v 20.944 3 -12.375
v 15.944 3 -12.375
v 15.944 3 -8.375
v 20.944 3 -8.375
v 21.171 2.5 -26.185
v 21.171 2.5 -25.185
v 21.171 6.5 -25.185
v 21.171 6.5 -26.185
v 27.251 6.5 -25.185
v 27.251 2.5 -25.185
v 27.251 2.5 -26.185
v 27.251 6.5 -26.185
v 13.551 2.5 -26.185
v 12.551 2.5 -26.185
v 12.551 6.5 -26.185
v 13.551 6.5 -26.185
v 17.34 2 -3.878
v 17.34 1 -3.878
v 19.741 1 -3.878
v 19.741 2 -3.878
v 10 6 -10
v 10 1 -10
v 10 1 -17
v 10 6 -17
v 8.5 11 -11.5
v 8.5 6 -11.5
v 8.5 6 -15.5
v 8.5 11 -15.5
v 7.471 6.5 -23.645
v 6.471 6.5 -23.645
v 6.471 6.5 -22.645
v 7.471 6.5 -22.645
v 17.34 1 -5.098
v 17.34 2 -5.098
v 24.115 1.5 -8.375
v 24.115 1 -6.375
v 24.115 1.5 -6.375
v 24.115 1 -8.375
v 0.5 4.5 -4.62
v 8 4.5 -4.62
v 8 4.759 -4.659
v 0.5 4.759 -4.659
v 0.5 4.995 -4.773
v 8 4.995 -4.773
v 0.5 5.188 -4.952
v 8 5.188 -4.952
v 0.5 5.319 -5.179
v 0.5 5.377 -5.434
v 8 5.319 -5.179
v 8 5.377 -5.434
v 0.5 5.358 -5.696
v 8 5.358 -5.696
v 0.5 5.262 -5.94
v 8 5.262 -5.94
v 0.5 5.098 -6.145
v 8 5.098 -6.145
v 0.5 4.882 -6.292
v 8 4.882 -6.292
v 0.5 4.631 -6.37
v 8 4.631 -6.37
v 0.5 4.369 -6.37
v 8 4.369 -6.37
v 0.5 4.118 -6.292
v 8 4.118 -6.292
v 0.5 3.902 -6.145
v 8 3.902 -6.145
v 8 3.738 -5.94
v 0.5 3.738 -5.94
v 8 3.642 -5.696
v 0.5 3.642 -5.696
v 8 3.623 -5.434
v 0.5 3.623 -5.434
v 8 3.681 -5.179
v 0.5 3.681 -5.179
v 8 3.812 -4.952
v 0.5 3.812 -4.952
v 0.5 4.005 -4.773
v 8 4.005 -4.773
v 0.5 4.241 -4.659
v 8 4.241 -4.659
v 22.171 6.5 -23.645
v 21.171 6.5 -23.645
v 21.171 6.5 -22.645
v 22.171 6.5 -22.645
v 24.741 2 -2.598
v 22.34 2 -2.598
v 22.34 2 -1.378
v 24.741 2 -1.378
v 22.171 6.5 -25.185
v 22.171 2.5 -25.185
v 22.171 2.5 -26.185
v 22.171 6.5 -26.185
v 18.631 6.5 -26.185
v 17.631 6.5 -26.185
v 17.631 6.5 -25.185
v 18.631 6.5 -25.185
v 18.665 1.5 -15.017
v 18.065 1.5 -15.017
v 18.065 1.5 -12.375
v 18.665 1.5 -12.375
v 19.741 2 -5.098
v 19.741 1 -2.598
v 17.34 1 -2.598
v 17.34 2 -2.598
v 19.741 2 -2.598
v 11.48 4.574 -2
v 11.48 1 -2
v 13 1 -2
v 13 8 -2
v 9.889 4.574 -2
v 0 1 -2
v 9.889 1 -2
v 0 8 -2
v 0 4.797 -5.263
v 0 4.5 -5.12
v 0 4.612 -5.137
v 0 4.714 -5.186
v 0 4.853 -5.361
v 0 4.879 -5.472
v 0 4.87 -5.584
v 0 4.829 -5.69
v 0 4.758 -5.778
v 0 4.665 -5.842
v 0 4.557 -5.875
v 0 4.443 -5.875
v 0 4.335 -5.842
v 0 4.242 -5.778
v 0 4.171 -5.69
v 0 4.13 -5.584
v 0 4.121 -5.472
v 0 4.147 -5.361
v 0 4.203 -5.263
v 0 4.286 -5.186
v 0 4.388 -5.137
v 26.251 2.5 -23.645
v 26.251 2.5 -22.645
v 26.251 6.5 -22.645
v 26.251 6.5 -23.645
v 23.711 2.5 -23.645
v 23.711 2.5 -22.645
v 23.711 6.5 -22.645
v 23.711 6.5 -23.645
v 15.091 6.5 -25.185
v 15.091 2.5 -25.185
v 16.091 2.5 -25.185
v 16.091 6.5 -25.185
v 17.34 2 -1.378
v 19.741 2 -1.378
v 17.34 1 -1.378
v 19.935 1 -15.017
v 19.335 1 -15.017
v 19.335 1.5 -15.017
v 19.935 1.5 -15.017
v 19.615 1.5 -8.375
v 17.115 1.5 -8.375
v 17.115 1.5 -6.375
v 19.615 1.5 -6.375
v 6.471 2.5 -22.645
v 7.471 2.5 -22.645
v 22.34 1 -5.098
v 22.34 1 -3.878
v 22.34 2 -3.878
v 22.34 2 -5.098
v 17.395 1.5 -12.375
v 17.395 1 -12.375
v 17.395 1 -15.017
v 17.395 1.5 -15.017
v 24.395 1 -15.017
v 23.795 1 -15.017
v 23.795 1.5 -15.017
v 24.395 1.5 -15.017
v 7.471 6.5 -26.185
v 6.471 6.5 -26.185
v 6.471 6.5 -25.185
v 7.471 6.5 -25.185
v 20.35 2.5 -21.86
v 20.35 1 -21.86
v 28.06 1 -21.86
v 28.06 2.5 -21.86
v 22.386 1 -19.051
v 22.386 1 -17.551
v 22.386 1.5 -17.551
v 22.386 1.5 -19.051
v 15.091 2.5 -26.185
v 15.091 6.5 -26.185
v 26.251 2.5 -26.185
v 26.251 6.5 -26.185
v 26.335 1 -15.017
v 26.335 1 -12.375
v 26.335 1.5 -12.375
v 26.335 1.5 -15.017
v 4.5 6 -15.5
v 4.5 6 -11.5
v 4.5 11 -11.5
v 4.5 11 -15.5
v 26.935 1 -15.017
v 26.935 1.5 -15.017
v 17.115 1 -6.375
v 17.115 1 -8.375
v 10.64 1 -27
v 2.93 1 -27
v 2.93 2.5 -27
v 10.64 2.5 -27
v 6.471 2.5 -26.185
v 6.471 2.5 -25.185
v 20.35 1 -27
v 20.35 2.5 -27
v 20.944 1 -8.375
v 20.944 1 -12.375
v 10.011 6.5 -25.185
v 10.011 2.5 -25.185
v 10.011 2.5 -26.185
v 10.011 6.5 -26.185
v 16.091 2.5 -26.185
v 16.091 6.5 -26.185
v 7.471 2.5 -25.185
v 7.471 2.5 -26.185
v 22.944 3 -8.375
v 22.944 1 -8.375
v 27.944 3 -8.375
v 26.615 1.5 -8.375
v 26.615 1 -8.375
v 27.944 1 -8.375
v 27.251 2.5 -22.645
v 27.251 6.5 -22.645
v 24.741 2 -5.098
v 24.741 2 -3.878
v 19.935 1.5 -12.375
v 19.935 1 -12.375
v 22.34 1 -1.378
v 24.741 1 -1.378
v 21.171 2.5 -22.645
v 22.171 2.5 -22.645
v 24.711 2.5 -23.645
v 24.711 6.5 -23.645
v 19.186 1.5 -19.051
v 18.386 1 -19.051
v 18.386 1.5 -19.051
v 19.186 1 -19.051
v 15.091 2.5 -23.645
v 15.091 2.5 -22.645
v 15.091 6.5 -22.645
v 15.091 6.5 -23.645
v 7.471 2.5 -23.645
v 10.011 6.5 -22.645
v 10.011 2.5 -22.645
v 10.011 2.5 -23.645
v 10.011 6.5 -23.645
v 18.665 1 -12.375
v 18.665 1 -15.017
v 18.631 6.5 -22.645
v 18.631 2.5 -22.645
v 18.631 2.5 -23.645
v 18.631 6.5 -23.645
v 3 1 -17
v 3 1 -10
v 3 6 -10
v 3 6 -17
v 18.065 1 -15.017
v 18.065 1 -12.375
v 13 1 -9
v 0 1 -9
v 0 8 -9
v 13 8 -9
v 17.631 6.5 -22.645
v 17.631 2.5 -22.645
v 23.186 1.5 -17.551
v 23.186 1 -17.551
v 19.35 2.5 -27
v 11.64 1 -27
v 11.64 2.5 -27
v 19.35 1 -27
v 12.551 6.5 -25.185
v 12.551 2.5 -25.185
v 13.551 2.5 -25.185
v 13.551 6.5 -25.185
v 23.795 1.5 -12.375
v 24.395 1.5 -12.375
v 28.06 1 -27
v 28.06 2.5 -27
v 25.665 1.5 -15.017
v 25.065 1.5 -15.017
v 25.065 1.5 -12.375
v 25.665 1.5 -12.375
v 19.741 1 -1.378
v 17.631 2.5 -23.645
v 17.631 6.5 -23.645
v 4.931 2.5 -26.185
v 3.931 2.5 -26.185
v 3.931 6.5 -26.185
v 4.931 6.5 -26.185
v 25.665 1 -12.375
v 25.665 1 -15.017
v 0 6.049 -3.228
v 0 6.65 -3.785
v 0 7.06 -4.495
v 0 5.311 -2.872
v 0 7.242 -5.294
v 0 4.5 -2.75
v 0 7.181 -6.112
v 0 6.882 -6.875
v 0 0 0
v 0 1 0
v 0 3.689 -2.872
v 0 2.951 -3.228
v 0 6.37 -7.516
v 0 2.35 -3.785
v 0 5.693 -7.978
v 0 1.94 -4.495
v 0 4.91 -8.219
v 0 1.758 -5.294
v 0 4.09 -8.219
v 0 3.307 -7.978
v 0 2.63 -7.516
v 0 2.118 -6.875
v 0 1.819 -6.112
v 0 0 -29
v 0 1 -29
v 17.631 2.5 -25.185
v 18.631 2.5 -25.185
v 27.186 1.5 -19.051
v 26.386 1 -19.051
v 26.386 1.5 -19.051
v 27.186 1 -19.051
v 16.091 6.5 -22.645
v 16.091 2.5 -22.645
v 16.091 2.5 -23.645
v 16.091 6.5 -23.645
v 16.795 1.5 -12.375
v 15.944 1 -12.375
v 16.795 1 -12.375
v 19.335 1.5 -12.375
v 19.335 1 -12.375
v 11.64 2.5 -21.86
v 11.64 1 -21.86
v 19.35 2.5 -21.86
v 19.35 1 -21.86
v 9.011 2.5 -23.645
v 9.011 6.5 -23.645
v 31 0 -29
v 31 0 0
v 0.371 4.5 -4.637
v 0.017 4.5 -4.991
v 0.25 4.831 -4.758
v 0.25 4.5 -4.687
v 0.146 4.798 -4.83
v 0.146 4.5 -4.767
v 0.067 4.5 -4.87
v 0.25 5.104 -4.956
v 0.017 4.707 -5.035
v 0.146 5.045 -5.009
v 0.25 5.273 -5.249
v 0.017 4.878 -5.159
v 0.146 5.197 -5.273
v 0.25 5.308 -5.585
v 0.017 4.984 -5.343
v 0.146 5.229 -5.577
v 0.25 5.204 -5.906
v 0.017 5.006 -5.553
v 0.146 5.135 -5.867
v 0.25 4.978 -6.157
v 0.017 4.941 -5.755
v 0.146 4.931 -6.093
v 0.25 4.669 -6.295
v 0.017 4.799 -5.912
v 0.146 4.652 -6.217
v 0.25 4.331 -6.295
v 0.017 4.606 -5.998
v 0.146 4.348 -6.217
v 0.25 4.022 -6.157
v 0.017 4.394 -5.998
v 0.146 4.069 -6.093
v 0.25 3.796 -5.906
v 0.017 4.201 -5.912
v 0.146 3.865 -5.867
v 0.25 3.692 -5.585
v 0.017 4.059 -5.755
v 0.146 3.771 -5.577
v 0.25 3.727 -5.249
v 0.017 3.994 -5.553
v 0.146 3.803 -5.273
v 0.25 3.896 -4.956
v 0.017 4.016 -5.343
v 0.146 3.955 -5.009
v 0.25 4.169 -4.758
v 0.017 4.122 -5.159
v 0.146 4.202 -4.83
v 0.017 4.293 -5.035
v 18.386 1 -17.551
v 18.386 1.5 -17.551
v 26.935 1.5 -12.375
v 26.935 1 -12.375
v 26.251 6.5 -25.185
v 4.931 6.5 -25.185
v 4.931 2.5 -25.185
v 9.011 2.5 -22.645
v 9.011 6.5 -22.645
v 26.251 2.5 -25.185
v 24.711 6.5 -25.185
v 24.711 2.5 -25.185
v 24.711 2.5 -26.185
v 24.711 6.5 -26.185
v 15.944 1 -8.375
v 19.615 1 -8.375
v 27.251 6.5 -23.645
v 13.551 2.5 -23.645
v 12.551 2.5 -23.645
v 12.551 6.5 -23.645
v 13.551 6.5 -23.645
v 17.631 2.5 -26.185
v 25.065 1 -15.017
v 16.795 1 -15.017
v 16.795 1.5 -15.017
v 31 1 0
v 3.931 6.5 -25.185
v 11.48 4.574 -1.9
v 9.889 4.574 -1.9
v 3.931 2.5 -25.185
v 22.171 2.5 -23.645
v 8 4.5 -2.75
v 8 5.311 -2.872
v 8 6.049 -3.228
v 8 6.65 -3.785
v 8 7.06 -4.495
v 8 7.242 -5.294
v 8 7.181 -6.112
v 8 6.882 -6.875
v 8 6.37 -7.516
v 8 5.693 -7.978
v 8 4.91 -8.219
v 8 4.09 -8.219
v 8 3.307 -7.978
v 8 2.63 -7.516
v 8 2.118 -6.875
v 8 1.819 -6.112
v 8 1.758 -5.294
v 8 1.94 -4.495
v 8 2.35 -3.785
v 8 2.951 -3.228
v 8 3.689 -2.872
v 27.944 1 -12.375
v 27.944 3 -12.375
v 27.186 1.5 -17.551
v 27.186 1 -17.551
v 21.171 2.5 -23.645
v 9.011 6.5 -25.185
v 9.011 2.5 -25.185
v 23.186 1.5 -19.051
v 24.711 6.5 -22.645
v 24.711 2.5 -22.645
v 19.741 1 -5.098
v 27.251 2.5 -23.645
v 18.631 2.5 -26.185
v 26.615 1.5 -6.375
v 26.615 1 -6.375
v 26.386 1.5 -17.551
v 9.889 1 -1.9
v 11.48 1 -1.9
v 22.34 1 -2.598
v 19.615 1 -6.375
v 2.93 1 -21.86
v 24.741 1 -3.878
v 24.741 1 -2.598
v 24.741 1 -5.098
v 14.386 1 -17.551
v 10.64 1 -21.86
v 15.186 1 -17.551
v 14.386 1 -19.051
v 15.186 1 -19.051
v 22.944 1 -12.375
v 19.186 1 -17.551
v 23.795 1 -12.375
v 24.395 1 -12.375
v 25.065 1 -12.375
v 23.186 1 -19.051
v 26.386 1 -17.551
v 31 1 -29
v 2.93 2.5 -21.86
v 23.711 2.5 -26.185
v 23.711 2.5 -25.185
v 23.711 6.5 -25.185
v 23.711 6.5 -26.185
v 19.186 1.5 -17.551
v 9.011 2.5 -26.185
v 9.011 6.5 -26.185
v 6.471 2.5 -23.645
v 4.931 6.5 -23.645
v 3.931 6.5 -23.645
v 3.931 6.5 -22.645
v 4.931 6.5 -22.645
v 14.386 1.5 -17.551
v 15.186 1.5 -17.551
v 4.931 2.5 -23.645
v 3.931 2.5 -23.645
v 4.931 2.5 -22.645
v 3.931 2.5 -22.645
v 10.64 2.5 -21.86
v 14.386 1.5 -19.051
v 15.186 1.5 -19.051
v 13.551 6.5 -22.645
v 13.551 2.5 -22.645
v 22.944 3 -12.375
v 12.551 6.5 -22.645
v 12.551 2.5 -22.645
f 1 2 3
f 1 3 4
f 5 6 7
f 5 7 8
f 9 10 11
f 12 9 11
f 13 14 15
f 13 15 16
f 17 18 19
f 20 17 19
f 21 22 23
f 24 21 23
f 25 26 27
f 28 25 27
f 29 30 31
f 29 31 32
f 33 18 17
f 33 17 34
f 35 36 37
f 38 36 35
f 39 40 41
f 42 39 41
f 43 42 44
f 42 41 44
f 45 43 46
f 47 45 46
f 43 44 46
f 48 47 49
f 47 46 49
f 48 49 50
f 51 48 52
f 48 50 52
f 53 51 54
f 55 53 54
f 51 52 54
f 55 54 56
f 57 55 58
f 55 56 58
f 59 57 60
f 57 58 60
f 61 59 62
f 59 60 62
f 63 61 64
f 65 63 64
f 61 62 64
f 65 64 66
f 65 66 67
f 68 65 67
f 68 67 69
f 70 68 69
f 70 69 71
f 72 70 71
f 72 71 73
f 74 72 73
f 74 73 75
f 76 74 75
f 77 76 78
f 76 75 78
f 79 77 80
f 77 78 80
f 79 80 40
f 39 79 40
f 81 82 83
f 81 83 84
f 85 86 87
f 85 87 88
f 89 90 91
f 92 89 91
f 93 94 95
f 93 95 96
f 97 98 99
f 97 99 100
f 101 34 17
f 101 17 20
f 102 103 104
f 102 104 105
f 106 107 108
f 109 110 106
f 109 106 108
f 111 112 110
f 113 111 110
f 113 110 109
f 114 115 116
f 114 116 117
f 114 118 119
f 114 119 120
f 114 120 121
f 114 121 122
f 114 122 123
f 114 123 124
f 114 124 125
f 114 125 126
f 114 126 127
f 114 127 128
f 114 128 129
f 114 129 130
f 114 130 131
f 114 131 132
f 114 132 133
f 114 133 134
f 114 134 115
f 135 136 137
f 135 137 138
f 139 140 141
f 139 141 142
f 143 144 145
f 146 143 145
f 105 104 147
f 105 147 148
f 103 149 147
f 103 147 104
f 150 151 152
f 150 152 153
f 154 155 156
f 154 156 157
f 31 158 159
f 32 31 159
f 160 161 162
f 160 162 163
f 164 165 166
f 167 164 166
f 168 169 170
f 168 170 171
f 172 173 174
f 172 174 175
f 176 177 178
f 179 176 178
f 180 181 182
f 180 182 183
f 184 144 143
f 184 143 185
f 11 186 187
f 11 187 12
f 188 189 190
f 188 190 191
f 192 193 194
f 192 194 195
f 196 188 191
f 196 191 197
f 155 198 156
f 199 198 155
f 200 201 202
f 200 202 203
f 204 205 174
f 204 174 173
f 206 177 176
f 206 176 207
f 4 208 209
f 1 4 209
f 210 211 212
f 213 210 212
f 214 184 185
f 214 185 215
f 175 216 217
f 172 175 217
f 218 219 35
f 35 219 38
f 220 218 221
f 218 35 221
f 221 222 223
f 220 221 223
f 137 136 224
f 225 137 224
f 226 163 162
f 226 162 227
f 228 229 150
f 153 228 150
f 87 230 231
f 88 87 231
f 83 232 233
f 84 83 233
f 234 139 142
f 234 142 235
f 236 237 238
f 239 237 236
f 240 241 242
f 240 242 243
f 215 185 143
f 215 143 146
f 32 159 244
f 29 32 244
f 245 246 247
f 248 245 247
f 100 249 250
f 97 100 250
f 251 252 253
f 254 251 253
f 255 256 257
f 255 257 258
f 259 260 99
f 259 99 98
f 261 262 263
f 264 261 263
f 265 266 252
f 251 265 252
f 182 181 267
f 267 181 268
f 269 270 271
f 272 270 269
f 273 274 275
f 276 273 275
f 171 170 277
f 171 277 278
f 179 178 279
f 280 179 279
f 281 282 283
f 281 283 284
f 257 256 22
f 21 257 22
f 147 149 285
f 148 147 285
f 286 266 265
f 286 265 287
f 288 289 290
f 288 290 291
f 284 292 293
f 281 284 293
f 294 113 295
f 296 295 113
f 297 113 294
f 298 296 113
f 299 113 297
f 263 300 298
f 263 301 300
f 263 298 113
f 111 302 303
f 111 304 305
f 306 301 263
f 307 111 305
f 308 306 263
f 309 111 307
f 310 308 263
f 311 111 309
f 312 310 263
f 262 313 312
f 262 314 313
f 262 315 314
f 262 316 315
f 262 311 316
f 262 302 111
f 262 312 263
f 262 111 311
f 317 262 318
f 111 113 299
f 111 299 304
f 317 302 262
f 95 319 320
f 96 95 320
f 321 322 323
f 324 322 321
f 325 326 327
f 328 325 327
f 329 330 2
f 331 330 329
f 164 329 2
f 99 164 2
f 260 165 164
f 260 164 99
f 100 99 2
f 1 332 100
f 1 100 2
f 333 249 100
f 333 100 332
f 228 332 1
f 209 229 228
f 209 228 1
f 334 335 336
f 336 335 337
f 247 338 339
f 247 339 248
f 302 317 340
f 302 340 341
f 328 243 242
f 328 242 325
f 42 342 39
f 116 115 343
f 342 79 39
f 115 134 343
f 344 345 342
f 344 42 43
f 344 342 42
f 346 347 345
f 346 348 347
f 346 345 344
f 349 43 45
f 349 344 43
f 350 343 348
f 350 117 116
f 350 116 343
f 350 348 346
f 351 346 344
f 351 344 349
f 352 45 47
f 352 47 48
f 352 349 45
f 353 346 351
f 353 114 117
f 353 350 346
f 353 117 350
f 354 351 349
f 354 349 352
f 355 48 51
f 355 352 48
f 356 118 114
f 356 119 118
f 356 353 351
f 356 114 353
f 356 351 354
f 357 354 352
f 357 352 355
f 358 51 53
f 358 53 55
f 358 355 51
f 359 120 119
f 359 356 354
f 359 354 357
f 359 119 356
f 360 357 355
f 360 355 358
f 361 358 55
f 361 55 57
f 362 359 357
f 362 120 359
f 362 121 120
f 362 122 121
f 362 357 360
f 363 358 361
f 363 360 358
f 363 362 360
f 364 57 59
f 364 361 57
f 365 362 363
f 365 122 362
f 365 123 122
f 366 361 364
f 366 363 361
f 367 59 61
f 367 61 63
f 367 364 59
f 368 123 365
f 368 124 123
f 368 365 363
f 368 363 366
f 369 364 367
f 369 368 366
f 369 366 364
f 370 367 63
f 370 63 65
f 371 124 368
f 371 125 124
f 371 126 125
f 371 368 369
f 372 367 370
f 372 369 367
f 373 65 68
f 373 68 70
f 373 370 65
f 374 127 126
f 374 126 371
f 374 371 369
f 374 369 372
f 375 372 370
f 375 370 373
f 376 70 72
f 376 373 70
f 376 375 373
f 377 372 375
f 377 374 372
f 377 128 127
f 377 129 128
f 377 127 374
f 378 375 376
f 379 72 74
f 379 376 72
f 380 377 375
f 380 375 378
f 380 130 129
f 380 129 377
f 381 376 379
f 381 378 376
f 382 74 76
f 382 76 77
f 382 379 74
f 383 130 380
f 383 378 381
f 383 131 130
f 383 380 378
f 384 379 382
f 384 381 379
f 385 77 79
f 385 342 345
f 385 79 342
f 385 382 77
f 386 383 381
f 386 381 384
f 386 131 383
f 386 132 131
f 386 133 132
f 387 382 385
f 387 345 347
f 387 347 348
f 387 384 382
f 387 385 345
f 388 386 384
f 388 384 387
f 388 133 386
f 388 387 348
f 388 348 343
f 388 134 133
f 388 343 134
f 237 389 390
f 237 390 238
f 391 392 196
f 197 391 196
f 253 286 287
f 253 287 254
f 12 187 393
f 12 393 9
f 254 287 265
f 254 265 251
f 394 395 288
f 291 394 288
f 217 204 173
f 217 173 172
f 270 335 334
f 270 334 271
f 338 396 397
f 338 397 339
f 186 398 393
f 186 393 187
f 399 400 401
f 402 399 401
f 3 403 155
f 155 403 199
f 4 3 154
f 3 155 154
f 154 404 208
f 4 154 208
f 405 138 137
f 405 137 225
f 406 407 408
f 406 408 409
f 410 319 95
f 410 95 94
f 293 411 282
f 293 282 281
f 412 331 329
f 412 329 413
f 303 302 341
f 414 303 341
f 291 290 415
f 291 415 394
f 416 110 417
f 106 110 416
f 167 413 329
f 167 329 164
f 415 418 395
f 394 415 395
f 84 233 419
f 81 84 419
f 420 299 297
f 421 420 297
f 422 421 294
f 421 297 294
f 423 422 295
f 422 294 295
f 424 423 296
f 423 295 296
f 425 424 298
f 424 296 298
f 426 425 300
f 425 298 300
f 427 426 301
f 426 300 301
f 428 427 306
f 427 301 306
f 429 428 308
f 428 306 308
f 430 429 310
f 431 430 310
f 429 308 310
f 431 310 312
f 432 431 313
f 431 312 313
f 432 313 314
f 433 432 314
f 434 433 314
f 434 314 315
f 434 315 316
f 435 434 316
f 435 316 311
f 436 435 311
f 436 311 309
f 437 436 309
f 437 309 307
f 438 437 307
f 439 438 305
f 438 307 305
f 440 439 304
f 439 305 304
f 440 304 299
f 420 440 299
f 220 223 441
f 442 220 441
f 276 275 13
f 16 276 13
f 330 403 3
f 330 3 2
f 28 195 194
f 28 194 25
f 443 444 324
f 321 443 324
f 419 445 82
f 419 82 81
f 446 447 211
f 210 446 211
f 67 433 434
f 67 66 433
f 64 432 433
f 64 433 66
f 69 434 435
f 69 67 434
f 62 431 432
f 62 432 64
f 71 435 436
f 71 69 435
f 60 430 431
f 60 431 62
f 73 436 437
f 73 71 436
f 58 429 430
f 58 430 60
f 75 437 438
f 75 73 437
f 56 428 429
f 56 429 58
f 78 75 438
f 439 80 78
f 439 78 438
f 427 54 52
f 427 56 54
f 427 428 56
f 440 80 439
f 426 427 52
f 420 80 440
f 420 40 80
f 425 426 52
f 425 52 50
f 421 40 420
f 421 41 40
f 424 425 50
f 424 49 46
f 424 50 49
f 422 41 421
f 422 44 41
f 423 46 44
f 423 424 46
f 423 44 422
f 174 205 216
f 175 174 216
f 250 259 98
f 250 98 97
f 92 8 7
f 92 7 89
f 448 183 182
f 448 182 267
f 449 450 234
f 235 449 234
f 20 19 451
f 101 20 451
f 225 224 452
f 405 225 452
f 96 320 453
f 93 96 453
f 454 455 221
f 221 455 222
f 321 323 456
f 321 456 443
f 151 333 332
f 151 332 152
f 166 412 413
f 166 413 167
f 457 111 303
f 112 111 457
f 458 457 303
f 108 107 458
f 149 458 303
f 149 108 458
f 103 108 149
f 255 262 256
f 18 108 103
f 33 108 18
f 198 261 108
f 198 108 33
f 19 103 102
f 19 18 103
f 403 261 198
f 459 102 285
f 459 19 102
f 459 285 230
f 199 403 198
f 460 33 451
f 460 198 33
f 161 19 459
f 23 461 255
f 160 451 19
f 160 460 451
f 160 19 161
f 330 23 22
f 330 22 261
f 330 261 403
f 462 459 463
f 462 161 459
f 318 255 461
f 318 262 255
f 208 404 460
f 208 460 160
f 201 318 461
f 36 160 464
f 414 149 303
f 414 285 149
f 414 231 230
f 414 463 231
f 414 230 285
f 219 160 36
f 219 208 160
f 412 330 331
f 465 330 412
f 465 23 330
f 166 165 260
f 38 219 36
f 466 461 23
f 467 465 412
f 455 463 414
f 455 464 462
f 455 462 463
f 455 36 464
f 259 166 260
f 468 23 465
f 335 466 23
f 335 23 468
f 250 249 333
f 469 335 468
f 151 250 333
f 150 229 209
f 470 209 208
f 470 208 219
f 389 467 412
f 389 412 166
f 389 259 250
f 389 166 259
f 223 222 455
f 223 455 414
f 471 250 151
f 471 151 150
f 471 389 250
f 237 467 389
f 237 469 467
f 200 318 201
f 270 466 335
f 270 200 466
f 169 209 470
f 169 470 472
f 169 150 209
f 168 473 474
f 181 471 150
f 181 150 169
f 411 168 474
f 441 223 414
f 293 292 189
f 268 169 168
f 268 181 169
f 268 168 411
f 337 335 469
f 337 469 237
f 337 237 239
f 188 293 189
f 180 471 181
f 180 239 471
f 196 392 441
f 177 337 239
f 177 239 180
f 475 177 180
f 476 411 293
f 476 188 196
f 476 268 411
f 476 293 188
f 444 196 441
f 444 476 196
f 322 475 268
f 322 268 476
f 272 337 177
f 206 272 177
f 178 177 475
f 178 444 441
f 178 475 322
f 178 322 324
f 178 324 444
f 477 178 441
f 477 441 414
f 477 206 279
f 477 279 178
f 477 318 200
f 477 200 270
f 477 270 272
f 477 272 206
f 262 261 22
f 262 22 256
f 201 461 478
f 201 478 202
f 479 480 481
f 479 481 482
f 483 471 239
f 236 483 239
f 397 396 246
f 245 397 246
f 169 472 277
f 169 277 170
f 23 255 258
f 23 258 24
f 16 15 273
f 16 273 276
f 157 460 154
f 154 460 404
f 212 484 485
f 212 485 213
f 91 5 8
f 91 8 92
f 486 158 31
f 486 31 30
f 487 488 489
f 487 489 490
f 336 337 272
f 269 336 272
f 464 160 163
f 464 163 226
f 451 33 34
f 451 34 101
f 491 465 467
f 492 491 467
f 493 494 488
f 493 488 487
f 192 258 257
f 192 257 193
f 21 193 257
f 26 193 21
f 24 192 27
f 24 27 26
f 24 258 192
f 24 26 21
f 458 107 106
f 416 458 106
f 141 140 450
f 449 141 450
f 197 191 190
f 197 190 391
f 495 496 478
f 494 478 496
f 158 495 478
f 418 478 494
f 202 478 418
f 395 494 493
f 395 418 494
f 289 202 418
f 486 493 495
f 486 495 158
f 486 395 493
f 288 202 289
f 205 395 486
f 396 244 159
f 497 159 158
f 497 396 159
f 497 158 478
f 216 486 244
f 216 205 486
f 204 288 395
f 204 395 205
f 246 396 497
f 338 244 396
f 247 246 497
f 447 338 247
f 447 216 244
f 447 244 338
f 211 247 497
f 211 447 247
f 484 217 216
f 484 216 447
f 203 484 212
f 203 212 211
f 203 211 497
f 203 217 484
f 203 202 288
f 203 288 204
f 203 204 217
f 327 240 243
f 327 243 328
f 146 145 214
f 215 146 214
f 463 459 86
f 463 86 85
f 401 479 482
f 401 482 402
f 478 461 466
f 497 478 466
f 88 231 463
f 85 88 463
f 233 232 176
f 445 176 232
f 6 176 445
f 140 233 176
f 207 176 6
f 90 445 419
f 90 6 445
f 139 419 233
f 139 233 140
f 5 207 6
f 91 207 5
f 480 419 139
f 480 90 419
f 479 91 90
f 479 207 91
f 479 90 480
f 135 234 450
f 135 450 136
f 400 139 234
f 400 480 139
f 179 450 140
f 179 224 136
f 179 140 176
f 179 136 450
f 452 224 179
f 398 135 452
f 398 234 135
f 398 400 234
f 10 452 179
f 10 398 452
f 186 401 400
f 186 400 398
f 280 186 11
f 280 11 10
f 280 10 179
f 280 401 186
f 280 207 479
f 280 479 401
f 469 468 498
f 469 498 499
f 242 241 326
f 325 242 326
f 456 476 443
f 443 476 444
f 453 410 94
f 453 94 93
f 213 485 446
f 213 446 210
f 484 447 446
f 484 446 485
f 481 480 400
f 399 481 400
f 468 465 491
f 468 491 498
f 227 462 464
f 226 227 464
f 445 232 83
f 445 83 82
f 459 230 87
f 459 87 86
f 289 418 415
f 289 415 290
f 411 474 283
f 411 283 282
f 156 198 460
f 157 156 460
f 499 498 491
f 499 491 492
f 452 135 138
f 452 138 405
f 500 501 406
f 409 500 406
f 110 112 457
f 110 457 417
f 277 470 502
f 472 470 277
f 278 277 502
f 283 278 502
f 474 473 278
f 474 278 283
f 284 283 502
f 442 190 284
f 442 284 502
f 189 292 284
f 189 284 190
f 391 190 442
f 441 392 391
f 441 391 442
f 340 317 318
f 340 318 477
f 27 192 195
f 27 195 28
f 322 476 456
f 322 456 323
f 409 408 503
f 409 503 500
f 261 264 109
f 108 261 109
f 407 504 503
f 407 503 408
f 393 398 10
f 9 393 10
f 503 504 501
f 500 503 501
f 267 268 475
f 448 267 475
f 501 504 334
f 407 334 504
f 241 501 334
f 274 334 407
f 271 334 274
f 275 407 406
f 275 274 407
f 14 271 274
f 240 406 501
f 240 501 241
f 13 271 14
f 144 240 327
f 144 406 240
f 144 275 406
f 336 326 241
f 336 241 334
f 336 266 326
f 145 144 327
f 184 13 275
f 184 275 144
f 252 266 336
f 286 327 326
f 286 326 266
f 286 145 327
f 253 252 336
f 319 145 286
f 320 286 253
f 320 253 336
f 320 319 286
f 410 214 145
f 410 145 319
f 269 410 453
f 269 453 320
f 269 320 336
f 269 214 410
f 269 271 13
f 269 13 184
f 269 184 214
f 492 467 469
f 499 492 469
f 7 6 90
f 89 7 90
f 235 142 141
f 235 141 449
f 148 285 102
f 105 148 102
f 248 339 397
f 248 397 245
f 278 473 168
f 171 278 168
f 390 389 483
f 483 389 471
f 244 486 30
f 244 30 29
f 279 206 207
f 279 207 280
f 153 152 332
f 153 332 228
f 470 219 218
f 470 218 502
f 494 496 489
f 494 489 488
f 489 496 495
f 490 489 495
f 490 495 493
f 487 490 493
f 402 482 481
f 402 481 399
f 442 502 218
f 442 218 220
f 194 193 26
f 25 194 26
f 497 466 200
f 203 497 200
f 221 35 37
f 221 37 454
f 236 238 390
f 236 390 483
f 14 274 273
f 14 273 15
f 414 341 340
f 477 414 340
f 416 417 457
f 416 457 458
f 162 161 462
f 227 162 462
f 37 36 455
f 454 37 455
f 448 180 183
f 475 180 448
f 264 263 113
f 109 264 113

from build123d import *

# Parameters (mm, degrees)
SKETCH1_W            = 31
SKETCH1_H            = 29
BOSS_EXTRUDE1_DEPTH  = 1
SKETCH2_W            = 7
SKETCH2_H            = 8
BOSS_EXTRUDE2_DEPTH  = 13
SKETCH3_W            = 7
SKETCH3_H            = 7
BOSS_EXTRUDE3_DEPTH  = 5
SKETCH4_W            = 4
SKETCH4_H            = 4
BOSS_EXTRUDE4_DEPTH  = 5
SKETCH5_R            = 2.75
CUT_EXTRUDE1_DEPTH   = 8
SKETCH6_W            = 1.591238362
SKETCH6_H            = 3.57435367
BOSS_EXTRUDE5_DEPTH  = 0.1
SKETCH7_R            = 0.879599875
BOSS_EXTRUDE6_DEPTH  = 8
FILLET2_R            = 0.5
SKETCH8_W            = 7.71
SKETCH8_H            = 5.14
BOSS_EXTRUDE7_DEPTH  = 1.5
SKETCH9_W            = 1
SKETCH9_H            = 1
BOSS_EXTRUDE8_DEPTH  = 4
SKETCH10_W           = 0.8
SKETCH10_H           = 1.5
BOSS_EXTRUDE9_DEPTH  = 0.5
SKETCH11_W           = 5
SKETCH11_H           = 4
BOSS_EXTRUDE10_DEPTH = 2
SKETCH12_W           = 0.6
SKETCH12_H           = 2.642715267
BOSS_EXTRUDE11_DEPTH = 0.5
SKETCH13_W           = 2.5
SKETCH13_H           = 2
BOSS_EXTRUDE12_DEPTH = 0.5
SKETCH14_W           = 2.401106116
SKETCH14_H           = 1.2192983
BOSS_EXTRUDE13_DEPTH = 1


with BuildPart() as part:
    # Sketch1 → Boss-Extrude1 (new body)
    with BuildSketch(Plane(origin=(0, 0, 0), x_dir=(1, 0, 0), z_dir=(0, 1, 0))):
        with Locations((15.5, 14.5)):
            Rectangle(SKETCH1_W, SKETCH1_H)
    extrude(amount=BOSS_EXTRUDE1_DEPTH)

    # Sketch2 → Boss-Extrude2 (add)
    with BuildSketch(Plane.ZY):
        with Locations((-5.5, 4)):
            Rectangle(SKETCH2_W, SKETCH2_H)
    extrude(amount=-BOSS_EXTRUDE2_DEPTH)

    # Sketch3 → Boss-Extrude3 (add)
    with BuildSketch(Plane(origin=(0, 1, 0), x_dir=(1, 0, 0), z_dir=(0, 1, 0))):
        with Locations((6.5, 13.5)):
            Rectangle(SKETCH3_W, SKETCH3_H)
    extrude(amount=BOSS_EXTRUDE3_DEPTH)

    # Sketch4 → Boss-Extrude4 (add)
    with BuildSketch(Plane(origin=(0, 6, 0), x_dir=(1, 0, 0), z_dir=(0, 1, 0))):
        with Locations((6.5, 13.5)):
            Rectangle(SKETCH4_W, SKETCH4_H)
    extrude(amount=BOSS_EXTRUDE4_DEPTH)

    # Sketch5 → Cut-Extrude1 (cut)
    with BuildSketch(Plane.ZY):
        with Locations((-5.5, 4.5)):
            Circle(SKETCH5_R)
    extrude(amount=-CUT_EXTRUDE1_DEPTH, mode=Mode.SUBTRACT)

    # Sketch6 → Boss-Extrude5 (add)
    with BuildSketch(Plane.XY.offset(-2)):
        with Locations((10.684219388, 2.787176835)):
            Rectangle(SKETCH6_W, SKETCH6_H)
    extrude(amount=BOSS_EXTRUDE5_DEPTH)

    # Sketch7 → Boss-Extrude6 (add)
    with BuildSketch(Plane.ZY.offset(-8)):
        with Locations((-5.5, 4.5)):
            Circle(SKETCH7_R)
    extrude(amount=BOSS_EXTRUDE6_DEPTH)

    # Fillet2
    fillet2_edges = [part.edges().sort_by_distance(p)[0] for p in [
        (0, 4.5, -6.379599875),
    ]]
    fillet(fillet2_edges, radius=FILLET2_R)

    # Sketch8 → Boss-Extrude7 (add)
    with BuildSketch(Plane(origin=(0, 1, 0), x_dir=(1, 0, 0), z_dir=(0, 1, 0))):
        with Locations((15.495, 24.43)):
            Rectangle(SKETCH8_W, SKETCH8_H)
        with Locations((6.785, 24.43)):
            Rectangle(SKETCH8_W, SKETCH8_H)
        with Locations((24.205, 24.43)):
            Rectangle(SKETCH8_W, SKETCH8_H)
    extrude(amount=BOSS_EXTRUDE7_DEPTH)

    # Sketch9 → Boss-Extrude8 (add)
    with BuildSketch(Plane(origin=(0, 2.5, 0), x_dir=(1, 0, 0), z_dir=(0, 1, 0))):
        with Locations((6.971468334, 25.685)):
            Rectangle(SKETCH9_W, SKETCH9_H)
        with Locations((4.431468334, 25.685)):
            Rectangle(SKETCH9_W, SKETCH9_H)
        with Locations((9.511468334, 25.685)):
            Rectangle(SKETCH9_W, SKETCH9_H)
        with Locations((4.431468334, 23.145)):
            Rectangle(SKETCH9_W, SKETCH9_H)
        with Locations((13.051468334, 23.145)):
            Rectangle(SKETCH9_W, SKETCH9_H)
        with Locations((6.971468334, 23.145)):
            Rectangle(SKETCH9_W, SKETCH9_H)
        with Locations((9.511468334, 23.145)):
            Rectangle(SKETCH9_W, SKETCH9_H)
        with Locations((18.131468334, 25.685)):
            Rectangle(SKETCH9_W, SKETCH9_H)
        with Locations((18.131468334, 23.145)):
            Rectangle(SKETCH9_W, SKETCH9_H)
        with Locations((15.591468334, 23.145)):
            Rectangle(SKETCH9_W, SKETCH9_H)
        with Locations((15.591468334, 25.685)):
            Rectangle(SKETCH9_W, SKETCH9_H)
        with Locations((13.051468334, 25.685)):
            Rectangle(SKETCH9_W, SKETCH9_H)
        with Locations((21.671468334, 23.145)):
            Rectangle(SKETCH9_W, SKETCH9_H)
        with Locations((26.751468334, 25.685)):
            Rectangle(SKETCH9_W, SKETCH9_H)
        with Locations((26.751468334, 23.145)):
            Rectangle(SKETCH9_W, SKETCH9_H)
        with Locations((24.211468334, 23.145)):
            Rectangle(SKETCH9_W, SKETCH9_H)
        with Locations((24.211468334, 25.685)):
            Rectangle(SKETCH9_W, SKETCH9_H)
        with Locations((21.671468334, 25.685)):
            Rectangle(SKETCH9_W, SKETCH9_H)
    extrude(amount=BOSS_EXTRUDE8_DEPTH)

    # Sketch10 → Boss-Extrude9 (add)
    with BuildSketch(Plane(origin=(0, 1, 0), x_dir=(1, 0, 0), z_dir=(0, 1, 0))):
        with Locations((18.786083485, 18.300770285)):
            Rectangle(SKETCH10_W, SKETCH10_H)
        with Locations((14.786083485, 18.300770285)):
            Rectangle(SKETCH10_W, SKETCH10_H)
        with Locations((22.786083485, 18.300770285)):
            Rectangle(SKETCH10_W, SKETCH10_H)
        with Locations((26.786083485, 18.300770285)):
            Rectangle(SKETCH10_W, SKETCH10_H)
    extrude(amount=BOSS_EXTRUDE9_DEPTH)

    # Sketch11 → Boss-Extrude10 (add)
    with BuildSketch(Plane(origin=(0, 1, 0), x_dir=(1, 0, 0), z_dir=(0, 1, 0))):
        with Locations((25.443805994, 10.374755585)):
            Rectangle(SKETCH11_W, SKETCH11_H)
        with Locations((18.443805994, 10.374755585)):
            Rectangle(SKETCH11_W, SKETCH11_H)
    extrude(amount=BOSS_EXTRUDE10_DEPTH)

    # Sketch12 → Boss-Extrude11 (add)
    with BuildSketch(Plane(origin=(0, 1, 0), x_dir=(1, 0, 0), z_dir=(0, 1, 0))):
        with Locations((17.095277575, 13.696113219)):
            Rectangle(SKETCH12_W, SKETCH12_H)
        with Locations((24.095277575, 13.696113219)):
            Rectangle(SKETCH12_W, SKETCH12_H)
        with Locations((18.365277575, 13.696113219)):
            Rectangle(SKETCH12_W, SKETCH12_H)
        with Locations((19.635277575, 13.696113219)):
            Rectangle(SKETCH12_W, SKETCH12_H)
        with Locations((25.365277575, 13.696113219)):
            Rectangle(SKETCH12_W, SKETCH12_H)
        with Locations((26.635277575, 13.696113219)):
            Rectangle(SKETCH12_W, SKETCH12_H)
    extrude(amount=BOSS_EXTRUDE11_DEPTH)

    # Sketch13 → Boss-Extrude12 (add)
    with BuildSketch(Plane(origin=(0, 1, 0), x_dir=(1, 0, 0), z_dir=(0, 1, 0))):
        with Locations((18.365277575, 7.374755585)):
            Rectangle(SKETCH13_W, SKETCH13_H)
        with Locations((25.365277575, 7.374755585)):
            Rectangle(SKETCH13_W, SKETCH13_H)
    extrude(amount=BOSS_EXTRUDE12_DEPTH)

    # Sketch14 → Boss-Extrude13 (add)
    with BuildSketch(Plane(origin=(0, 1, 0), x_dir=(1, 0, 0), z_dir=(0, 1, 0))):
        with Locations((23.540566393, 4.488126974)):
            Rectangle(SKETCH14_W, SKETCH14_H)
        with Locations((18.540566393, 4.488126974)):
            Rectangle(SKETCH14_W, SKETCH14_H)
        with Locations((23.540566393, 1.988126974)):
            Rectangle(SKETCH14_W, SKETCH14_H)
        with Locations((18.540566393, 1.988126974)):
            Rectangle(SKETCH14_W, SKETCH14_H)
    extrude(amount=BOSS_EXTRUDE13_DEPTH)


solid = part.part
